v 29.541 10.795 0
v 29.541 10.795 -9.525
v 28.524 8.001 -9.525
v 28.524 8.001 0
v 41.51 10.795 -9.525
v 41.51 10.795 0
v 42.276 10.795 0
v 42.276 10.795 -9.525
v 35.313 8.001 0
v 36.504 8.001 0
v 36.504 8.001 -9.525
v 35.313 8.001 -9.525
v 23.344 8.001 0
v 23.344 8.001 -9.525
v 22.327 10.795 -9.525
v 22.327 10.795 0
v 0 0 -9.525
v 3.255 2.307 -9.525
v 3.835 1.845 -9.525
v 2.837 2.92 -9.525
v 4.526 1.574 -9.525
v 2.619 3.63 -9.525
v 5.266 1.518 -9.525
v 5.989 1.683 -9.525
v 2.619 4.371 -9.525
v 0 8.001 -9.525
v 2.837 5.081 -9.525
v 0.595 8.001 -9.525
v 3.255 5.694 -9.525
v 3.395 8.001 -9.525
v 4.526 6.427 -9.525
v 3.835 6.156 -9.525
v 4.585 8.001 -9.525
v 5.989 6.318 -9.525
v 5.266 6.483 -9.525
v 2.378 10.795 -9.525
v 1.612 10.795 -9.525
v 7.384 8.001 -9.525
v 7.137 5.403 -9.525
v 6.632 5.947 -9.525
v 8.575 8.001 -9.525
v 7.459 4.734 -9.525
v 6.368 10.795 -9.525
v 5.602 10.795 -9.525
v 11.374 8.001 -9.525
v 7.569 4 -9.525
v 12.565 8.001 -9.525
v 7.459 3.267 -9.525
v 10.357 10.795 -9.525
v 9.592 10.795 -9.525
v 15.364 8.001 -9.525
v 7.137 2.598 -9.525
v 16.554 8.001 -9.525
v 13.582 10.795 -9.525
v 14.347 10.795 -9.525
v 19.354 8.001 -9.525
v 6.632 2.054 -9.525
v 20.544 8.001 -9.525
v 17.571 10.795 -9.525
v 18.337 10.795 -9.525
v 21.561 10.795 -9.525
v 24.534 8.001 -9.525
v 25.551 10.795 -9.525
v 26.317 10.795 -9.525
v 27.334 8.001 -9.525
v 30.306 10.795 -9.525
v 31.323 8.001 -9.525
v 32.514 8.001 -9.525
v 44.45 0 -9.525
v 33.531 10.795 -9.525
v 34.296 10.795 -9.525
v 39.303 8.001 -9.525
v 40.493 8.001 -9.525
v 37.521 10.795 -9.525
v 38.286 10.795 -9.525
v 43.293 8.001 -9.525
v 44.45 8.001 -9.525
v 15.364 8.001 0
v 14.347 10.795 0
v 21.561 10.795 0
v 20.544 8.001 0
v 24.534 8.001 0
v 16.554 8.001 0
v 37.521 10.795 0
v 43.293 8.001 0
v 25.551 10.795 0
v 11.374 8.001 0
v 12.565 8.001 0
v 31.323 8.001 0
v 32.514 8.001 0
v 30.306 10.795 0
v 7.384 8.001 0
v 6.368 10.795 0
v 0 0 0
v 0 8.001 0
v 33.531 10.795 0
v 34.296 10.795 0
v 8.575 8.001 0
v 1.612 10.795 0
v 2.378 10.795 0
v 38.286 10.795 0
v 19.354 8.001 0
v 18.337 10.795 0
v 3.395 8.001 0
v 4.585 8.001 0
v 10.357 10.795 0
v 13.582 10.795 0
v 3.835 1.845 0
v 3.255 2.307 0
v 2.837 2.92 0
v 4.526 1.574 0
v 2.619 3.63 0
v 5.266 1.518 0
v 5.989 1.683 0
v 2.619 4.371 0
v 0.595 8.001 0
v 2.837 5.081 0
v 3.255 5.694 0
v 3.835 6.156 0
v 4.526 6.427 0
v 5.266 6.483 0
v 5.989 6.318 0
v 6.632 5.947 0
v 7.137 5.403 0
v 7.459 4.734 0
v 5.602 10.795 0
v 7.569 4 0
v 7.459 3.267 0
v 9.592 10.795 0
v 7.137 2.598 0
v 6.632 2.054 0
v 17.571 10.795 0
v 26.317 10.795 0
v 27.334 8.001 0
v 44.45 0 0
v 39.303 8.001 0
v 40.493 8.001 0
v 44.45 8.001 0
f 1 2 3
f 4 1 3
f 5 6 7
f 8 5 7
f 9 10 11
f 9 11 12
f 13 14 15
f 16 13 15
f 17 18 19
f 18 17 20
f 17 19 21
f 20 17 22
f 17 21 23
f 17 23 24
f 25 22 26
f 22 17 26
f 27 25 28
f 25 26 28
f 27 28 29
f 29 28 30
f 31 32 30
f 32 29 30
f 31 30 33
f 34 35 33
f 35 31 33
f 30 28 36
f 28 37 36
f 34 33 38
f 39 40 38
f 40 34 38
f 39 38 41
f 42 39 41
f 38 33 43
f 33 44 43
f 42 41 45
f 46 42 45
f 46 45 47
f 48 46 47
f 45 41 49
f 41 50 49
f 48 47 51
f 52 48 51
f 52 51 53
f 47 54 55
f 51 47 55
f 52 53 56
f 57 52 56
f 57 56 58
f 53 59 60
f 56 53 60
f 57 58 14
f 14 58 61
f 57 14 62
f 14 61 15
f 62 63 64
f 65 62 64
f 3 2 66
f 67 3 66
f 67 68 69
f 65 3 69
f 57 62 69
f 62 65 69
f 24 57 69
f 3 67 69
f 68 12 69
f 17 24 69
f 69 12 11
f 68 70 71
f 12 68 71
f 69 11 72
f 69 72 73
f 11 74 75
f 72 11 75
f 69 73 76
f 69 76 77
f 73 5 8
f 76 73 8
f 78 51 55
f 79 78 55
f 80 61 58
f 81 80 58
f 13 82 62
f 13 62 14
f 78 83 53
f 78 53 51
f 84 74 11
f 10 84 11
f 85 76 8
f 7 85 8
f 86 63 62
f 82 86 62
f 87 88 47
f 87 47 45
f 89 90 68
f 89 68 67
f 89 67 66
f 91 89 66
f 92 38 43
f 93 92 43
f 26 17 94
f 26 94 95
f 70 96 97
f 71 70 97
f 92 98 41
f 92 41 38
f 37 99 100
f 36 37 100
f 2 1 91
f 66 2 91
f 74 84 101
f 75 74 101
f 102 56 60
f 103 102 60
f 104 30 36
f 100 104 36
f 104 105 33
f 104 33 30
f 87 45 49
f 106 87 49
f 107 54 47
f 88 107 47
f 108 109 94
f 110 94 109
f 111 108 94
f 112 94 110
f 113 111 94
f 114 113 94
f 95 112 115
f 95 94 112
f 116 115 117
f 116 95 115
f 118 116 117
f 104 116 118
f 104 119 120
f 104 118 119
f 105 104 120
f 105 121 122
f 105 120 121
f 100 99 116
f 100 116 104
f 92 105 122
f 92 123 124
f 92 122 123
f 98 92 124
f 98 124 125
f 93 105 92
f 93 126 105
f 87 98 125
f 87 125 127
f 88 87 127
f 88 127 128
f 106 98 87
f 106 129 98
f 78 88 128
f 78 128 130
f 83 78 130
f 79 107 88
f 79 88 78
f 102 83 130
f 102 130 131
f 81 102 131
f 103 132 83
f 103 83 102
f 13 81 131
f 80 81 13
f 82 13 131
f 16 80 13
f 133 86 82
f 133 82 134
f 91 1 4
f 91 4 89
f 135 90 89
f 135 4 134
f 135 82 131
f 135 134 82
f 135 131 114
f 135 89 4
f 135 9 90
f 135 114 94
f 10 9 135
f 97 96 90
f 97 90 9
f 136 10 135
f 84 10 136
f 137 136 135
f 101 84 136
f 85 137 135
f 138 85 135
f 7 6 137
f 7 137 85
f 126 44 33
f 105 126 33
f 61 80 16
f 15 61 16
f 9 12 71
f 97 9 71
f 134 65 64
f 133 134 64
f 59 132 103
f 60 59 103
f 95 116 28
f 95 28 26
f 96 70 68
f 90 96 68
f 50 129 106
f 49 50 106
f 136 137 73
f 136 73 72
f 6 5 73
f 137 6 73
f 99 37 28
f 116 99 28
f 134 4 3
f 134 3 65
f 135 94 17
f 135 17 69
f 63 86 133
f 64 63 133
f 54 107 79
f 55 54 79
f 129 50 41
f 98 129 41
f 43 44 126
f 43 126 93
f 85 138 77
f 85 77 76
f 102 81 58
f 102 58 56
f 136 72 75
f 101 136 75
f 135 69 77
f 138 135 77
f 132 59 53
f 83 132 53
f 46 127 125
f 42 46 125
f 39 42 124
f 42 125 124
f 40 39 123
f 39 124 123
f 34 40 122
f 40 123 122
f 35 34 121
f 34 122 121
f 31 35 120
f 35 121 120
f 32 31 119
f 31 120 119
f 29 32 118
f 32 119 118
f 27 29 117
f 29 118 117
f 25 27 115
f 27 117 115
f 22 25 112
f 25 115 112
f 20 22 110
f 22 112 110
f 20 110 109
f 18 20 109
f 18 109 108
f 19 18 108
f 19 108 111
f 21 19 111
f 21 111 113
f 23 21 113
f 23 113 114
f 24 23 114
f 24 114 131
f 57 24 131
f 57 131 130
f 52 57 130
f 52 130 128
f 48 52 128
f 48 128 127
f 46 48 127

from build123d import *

# Parameters (mm, degrees)
BLANKSKE_W         = 44.45
BLANKSKE_H         = 10.795
BLANK_DEPTH        = 9.525
TOOTHCUTSIM_DEPTH  = 47.723229233
TEETHCUTS_COUNT    = 12
TEETHCUTS_PITCH    = 3.989822666
SKETCH1_R          = 2.4892
CUT_EXTRUDE1_DEPTH = 14.478


with BuildPart() as part:
    # BlankSke → Blank (new body)
    with BuildSketch(Plane.XY):
        with Locations((22.225, 5.3975)):
            Rectangle(BLANKSKE_W, BLANKSKE_H)
    extrude(amount=-BLANK_DEPTH)

    # TooCutSkeSim → ToothCutSim (cut, through all)
    with BuildSketch(Plane.XY):
        Polygon((0.595165029, 8.001), (-0.595165029, 8.001), (-1.621342708, 10.8204), (1.621342708, 10.8204), align=None)
    toothcutsim = extrude(amount=-TOOTHCUTSIM_DEPTH, mode=Mode.SUBTRACT)

    # TeethCuts: ToothCutSim ×12
    with Locations(*[(i * TEETHCUTS_PITCH, 0, 0) for i in range(1, TEETHCUTS_COUNT)]):
        add(toothcutsim, mode=Mode.SUBTRACT)

    # Sketch1 → Cut-Extrude1 (cut)
    with BuildSketch(Plane.XY):
        with Locations((5.08, 4.0005)):
            Circle(SKETCH1_R)
    extrude(amount=-CUT_EXTRUDE1_DEPTH, mode=Mode.SUBTRACT)


solid = part.part
